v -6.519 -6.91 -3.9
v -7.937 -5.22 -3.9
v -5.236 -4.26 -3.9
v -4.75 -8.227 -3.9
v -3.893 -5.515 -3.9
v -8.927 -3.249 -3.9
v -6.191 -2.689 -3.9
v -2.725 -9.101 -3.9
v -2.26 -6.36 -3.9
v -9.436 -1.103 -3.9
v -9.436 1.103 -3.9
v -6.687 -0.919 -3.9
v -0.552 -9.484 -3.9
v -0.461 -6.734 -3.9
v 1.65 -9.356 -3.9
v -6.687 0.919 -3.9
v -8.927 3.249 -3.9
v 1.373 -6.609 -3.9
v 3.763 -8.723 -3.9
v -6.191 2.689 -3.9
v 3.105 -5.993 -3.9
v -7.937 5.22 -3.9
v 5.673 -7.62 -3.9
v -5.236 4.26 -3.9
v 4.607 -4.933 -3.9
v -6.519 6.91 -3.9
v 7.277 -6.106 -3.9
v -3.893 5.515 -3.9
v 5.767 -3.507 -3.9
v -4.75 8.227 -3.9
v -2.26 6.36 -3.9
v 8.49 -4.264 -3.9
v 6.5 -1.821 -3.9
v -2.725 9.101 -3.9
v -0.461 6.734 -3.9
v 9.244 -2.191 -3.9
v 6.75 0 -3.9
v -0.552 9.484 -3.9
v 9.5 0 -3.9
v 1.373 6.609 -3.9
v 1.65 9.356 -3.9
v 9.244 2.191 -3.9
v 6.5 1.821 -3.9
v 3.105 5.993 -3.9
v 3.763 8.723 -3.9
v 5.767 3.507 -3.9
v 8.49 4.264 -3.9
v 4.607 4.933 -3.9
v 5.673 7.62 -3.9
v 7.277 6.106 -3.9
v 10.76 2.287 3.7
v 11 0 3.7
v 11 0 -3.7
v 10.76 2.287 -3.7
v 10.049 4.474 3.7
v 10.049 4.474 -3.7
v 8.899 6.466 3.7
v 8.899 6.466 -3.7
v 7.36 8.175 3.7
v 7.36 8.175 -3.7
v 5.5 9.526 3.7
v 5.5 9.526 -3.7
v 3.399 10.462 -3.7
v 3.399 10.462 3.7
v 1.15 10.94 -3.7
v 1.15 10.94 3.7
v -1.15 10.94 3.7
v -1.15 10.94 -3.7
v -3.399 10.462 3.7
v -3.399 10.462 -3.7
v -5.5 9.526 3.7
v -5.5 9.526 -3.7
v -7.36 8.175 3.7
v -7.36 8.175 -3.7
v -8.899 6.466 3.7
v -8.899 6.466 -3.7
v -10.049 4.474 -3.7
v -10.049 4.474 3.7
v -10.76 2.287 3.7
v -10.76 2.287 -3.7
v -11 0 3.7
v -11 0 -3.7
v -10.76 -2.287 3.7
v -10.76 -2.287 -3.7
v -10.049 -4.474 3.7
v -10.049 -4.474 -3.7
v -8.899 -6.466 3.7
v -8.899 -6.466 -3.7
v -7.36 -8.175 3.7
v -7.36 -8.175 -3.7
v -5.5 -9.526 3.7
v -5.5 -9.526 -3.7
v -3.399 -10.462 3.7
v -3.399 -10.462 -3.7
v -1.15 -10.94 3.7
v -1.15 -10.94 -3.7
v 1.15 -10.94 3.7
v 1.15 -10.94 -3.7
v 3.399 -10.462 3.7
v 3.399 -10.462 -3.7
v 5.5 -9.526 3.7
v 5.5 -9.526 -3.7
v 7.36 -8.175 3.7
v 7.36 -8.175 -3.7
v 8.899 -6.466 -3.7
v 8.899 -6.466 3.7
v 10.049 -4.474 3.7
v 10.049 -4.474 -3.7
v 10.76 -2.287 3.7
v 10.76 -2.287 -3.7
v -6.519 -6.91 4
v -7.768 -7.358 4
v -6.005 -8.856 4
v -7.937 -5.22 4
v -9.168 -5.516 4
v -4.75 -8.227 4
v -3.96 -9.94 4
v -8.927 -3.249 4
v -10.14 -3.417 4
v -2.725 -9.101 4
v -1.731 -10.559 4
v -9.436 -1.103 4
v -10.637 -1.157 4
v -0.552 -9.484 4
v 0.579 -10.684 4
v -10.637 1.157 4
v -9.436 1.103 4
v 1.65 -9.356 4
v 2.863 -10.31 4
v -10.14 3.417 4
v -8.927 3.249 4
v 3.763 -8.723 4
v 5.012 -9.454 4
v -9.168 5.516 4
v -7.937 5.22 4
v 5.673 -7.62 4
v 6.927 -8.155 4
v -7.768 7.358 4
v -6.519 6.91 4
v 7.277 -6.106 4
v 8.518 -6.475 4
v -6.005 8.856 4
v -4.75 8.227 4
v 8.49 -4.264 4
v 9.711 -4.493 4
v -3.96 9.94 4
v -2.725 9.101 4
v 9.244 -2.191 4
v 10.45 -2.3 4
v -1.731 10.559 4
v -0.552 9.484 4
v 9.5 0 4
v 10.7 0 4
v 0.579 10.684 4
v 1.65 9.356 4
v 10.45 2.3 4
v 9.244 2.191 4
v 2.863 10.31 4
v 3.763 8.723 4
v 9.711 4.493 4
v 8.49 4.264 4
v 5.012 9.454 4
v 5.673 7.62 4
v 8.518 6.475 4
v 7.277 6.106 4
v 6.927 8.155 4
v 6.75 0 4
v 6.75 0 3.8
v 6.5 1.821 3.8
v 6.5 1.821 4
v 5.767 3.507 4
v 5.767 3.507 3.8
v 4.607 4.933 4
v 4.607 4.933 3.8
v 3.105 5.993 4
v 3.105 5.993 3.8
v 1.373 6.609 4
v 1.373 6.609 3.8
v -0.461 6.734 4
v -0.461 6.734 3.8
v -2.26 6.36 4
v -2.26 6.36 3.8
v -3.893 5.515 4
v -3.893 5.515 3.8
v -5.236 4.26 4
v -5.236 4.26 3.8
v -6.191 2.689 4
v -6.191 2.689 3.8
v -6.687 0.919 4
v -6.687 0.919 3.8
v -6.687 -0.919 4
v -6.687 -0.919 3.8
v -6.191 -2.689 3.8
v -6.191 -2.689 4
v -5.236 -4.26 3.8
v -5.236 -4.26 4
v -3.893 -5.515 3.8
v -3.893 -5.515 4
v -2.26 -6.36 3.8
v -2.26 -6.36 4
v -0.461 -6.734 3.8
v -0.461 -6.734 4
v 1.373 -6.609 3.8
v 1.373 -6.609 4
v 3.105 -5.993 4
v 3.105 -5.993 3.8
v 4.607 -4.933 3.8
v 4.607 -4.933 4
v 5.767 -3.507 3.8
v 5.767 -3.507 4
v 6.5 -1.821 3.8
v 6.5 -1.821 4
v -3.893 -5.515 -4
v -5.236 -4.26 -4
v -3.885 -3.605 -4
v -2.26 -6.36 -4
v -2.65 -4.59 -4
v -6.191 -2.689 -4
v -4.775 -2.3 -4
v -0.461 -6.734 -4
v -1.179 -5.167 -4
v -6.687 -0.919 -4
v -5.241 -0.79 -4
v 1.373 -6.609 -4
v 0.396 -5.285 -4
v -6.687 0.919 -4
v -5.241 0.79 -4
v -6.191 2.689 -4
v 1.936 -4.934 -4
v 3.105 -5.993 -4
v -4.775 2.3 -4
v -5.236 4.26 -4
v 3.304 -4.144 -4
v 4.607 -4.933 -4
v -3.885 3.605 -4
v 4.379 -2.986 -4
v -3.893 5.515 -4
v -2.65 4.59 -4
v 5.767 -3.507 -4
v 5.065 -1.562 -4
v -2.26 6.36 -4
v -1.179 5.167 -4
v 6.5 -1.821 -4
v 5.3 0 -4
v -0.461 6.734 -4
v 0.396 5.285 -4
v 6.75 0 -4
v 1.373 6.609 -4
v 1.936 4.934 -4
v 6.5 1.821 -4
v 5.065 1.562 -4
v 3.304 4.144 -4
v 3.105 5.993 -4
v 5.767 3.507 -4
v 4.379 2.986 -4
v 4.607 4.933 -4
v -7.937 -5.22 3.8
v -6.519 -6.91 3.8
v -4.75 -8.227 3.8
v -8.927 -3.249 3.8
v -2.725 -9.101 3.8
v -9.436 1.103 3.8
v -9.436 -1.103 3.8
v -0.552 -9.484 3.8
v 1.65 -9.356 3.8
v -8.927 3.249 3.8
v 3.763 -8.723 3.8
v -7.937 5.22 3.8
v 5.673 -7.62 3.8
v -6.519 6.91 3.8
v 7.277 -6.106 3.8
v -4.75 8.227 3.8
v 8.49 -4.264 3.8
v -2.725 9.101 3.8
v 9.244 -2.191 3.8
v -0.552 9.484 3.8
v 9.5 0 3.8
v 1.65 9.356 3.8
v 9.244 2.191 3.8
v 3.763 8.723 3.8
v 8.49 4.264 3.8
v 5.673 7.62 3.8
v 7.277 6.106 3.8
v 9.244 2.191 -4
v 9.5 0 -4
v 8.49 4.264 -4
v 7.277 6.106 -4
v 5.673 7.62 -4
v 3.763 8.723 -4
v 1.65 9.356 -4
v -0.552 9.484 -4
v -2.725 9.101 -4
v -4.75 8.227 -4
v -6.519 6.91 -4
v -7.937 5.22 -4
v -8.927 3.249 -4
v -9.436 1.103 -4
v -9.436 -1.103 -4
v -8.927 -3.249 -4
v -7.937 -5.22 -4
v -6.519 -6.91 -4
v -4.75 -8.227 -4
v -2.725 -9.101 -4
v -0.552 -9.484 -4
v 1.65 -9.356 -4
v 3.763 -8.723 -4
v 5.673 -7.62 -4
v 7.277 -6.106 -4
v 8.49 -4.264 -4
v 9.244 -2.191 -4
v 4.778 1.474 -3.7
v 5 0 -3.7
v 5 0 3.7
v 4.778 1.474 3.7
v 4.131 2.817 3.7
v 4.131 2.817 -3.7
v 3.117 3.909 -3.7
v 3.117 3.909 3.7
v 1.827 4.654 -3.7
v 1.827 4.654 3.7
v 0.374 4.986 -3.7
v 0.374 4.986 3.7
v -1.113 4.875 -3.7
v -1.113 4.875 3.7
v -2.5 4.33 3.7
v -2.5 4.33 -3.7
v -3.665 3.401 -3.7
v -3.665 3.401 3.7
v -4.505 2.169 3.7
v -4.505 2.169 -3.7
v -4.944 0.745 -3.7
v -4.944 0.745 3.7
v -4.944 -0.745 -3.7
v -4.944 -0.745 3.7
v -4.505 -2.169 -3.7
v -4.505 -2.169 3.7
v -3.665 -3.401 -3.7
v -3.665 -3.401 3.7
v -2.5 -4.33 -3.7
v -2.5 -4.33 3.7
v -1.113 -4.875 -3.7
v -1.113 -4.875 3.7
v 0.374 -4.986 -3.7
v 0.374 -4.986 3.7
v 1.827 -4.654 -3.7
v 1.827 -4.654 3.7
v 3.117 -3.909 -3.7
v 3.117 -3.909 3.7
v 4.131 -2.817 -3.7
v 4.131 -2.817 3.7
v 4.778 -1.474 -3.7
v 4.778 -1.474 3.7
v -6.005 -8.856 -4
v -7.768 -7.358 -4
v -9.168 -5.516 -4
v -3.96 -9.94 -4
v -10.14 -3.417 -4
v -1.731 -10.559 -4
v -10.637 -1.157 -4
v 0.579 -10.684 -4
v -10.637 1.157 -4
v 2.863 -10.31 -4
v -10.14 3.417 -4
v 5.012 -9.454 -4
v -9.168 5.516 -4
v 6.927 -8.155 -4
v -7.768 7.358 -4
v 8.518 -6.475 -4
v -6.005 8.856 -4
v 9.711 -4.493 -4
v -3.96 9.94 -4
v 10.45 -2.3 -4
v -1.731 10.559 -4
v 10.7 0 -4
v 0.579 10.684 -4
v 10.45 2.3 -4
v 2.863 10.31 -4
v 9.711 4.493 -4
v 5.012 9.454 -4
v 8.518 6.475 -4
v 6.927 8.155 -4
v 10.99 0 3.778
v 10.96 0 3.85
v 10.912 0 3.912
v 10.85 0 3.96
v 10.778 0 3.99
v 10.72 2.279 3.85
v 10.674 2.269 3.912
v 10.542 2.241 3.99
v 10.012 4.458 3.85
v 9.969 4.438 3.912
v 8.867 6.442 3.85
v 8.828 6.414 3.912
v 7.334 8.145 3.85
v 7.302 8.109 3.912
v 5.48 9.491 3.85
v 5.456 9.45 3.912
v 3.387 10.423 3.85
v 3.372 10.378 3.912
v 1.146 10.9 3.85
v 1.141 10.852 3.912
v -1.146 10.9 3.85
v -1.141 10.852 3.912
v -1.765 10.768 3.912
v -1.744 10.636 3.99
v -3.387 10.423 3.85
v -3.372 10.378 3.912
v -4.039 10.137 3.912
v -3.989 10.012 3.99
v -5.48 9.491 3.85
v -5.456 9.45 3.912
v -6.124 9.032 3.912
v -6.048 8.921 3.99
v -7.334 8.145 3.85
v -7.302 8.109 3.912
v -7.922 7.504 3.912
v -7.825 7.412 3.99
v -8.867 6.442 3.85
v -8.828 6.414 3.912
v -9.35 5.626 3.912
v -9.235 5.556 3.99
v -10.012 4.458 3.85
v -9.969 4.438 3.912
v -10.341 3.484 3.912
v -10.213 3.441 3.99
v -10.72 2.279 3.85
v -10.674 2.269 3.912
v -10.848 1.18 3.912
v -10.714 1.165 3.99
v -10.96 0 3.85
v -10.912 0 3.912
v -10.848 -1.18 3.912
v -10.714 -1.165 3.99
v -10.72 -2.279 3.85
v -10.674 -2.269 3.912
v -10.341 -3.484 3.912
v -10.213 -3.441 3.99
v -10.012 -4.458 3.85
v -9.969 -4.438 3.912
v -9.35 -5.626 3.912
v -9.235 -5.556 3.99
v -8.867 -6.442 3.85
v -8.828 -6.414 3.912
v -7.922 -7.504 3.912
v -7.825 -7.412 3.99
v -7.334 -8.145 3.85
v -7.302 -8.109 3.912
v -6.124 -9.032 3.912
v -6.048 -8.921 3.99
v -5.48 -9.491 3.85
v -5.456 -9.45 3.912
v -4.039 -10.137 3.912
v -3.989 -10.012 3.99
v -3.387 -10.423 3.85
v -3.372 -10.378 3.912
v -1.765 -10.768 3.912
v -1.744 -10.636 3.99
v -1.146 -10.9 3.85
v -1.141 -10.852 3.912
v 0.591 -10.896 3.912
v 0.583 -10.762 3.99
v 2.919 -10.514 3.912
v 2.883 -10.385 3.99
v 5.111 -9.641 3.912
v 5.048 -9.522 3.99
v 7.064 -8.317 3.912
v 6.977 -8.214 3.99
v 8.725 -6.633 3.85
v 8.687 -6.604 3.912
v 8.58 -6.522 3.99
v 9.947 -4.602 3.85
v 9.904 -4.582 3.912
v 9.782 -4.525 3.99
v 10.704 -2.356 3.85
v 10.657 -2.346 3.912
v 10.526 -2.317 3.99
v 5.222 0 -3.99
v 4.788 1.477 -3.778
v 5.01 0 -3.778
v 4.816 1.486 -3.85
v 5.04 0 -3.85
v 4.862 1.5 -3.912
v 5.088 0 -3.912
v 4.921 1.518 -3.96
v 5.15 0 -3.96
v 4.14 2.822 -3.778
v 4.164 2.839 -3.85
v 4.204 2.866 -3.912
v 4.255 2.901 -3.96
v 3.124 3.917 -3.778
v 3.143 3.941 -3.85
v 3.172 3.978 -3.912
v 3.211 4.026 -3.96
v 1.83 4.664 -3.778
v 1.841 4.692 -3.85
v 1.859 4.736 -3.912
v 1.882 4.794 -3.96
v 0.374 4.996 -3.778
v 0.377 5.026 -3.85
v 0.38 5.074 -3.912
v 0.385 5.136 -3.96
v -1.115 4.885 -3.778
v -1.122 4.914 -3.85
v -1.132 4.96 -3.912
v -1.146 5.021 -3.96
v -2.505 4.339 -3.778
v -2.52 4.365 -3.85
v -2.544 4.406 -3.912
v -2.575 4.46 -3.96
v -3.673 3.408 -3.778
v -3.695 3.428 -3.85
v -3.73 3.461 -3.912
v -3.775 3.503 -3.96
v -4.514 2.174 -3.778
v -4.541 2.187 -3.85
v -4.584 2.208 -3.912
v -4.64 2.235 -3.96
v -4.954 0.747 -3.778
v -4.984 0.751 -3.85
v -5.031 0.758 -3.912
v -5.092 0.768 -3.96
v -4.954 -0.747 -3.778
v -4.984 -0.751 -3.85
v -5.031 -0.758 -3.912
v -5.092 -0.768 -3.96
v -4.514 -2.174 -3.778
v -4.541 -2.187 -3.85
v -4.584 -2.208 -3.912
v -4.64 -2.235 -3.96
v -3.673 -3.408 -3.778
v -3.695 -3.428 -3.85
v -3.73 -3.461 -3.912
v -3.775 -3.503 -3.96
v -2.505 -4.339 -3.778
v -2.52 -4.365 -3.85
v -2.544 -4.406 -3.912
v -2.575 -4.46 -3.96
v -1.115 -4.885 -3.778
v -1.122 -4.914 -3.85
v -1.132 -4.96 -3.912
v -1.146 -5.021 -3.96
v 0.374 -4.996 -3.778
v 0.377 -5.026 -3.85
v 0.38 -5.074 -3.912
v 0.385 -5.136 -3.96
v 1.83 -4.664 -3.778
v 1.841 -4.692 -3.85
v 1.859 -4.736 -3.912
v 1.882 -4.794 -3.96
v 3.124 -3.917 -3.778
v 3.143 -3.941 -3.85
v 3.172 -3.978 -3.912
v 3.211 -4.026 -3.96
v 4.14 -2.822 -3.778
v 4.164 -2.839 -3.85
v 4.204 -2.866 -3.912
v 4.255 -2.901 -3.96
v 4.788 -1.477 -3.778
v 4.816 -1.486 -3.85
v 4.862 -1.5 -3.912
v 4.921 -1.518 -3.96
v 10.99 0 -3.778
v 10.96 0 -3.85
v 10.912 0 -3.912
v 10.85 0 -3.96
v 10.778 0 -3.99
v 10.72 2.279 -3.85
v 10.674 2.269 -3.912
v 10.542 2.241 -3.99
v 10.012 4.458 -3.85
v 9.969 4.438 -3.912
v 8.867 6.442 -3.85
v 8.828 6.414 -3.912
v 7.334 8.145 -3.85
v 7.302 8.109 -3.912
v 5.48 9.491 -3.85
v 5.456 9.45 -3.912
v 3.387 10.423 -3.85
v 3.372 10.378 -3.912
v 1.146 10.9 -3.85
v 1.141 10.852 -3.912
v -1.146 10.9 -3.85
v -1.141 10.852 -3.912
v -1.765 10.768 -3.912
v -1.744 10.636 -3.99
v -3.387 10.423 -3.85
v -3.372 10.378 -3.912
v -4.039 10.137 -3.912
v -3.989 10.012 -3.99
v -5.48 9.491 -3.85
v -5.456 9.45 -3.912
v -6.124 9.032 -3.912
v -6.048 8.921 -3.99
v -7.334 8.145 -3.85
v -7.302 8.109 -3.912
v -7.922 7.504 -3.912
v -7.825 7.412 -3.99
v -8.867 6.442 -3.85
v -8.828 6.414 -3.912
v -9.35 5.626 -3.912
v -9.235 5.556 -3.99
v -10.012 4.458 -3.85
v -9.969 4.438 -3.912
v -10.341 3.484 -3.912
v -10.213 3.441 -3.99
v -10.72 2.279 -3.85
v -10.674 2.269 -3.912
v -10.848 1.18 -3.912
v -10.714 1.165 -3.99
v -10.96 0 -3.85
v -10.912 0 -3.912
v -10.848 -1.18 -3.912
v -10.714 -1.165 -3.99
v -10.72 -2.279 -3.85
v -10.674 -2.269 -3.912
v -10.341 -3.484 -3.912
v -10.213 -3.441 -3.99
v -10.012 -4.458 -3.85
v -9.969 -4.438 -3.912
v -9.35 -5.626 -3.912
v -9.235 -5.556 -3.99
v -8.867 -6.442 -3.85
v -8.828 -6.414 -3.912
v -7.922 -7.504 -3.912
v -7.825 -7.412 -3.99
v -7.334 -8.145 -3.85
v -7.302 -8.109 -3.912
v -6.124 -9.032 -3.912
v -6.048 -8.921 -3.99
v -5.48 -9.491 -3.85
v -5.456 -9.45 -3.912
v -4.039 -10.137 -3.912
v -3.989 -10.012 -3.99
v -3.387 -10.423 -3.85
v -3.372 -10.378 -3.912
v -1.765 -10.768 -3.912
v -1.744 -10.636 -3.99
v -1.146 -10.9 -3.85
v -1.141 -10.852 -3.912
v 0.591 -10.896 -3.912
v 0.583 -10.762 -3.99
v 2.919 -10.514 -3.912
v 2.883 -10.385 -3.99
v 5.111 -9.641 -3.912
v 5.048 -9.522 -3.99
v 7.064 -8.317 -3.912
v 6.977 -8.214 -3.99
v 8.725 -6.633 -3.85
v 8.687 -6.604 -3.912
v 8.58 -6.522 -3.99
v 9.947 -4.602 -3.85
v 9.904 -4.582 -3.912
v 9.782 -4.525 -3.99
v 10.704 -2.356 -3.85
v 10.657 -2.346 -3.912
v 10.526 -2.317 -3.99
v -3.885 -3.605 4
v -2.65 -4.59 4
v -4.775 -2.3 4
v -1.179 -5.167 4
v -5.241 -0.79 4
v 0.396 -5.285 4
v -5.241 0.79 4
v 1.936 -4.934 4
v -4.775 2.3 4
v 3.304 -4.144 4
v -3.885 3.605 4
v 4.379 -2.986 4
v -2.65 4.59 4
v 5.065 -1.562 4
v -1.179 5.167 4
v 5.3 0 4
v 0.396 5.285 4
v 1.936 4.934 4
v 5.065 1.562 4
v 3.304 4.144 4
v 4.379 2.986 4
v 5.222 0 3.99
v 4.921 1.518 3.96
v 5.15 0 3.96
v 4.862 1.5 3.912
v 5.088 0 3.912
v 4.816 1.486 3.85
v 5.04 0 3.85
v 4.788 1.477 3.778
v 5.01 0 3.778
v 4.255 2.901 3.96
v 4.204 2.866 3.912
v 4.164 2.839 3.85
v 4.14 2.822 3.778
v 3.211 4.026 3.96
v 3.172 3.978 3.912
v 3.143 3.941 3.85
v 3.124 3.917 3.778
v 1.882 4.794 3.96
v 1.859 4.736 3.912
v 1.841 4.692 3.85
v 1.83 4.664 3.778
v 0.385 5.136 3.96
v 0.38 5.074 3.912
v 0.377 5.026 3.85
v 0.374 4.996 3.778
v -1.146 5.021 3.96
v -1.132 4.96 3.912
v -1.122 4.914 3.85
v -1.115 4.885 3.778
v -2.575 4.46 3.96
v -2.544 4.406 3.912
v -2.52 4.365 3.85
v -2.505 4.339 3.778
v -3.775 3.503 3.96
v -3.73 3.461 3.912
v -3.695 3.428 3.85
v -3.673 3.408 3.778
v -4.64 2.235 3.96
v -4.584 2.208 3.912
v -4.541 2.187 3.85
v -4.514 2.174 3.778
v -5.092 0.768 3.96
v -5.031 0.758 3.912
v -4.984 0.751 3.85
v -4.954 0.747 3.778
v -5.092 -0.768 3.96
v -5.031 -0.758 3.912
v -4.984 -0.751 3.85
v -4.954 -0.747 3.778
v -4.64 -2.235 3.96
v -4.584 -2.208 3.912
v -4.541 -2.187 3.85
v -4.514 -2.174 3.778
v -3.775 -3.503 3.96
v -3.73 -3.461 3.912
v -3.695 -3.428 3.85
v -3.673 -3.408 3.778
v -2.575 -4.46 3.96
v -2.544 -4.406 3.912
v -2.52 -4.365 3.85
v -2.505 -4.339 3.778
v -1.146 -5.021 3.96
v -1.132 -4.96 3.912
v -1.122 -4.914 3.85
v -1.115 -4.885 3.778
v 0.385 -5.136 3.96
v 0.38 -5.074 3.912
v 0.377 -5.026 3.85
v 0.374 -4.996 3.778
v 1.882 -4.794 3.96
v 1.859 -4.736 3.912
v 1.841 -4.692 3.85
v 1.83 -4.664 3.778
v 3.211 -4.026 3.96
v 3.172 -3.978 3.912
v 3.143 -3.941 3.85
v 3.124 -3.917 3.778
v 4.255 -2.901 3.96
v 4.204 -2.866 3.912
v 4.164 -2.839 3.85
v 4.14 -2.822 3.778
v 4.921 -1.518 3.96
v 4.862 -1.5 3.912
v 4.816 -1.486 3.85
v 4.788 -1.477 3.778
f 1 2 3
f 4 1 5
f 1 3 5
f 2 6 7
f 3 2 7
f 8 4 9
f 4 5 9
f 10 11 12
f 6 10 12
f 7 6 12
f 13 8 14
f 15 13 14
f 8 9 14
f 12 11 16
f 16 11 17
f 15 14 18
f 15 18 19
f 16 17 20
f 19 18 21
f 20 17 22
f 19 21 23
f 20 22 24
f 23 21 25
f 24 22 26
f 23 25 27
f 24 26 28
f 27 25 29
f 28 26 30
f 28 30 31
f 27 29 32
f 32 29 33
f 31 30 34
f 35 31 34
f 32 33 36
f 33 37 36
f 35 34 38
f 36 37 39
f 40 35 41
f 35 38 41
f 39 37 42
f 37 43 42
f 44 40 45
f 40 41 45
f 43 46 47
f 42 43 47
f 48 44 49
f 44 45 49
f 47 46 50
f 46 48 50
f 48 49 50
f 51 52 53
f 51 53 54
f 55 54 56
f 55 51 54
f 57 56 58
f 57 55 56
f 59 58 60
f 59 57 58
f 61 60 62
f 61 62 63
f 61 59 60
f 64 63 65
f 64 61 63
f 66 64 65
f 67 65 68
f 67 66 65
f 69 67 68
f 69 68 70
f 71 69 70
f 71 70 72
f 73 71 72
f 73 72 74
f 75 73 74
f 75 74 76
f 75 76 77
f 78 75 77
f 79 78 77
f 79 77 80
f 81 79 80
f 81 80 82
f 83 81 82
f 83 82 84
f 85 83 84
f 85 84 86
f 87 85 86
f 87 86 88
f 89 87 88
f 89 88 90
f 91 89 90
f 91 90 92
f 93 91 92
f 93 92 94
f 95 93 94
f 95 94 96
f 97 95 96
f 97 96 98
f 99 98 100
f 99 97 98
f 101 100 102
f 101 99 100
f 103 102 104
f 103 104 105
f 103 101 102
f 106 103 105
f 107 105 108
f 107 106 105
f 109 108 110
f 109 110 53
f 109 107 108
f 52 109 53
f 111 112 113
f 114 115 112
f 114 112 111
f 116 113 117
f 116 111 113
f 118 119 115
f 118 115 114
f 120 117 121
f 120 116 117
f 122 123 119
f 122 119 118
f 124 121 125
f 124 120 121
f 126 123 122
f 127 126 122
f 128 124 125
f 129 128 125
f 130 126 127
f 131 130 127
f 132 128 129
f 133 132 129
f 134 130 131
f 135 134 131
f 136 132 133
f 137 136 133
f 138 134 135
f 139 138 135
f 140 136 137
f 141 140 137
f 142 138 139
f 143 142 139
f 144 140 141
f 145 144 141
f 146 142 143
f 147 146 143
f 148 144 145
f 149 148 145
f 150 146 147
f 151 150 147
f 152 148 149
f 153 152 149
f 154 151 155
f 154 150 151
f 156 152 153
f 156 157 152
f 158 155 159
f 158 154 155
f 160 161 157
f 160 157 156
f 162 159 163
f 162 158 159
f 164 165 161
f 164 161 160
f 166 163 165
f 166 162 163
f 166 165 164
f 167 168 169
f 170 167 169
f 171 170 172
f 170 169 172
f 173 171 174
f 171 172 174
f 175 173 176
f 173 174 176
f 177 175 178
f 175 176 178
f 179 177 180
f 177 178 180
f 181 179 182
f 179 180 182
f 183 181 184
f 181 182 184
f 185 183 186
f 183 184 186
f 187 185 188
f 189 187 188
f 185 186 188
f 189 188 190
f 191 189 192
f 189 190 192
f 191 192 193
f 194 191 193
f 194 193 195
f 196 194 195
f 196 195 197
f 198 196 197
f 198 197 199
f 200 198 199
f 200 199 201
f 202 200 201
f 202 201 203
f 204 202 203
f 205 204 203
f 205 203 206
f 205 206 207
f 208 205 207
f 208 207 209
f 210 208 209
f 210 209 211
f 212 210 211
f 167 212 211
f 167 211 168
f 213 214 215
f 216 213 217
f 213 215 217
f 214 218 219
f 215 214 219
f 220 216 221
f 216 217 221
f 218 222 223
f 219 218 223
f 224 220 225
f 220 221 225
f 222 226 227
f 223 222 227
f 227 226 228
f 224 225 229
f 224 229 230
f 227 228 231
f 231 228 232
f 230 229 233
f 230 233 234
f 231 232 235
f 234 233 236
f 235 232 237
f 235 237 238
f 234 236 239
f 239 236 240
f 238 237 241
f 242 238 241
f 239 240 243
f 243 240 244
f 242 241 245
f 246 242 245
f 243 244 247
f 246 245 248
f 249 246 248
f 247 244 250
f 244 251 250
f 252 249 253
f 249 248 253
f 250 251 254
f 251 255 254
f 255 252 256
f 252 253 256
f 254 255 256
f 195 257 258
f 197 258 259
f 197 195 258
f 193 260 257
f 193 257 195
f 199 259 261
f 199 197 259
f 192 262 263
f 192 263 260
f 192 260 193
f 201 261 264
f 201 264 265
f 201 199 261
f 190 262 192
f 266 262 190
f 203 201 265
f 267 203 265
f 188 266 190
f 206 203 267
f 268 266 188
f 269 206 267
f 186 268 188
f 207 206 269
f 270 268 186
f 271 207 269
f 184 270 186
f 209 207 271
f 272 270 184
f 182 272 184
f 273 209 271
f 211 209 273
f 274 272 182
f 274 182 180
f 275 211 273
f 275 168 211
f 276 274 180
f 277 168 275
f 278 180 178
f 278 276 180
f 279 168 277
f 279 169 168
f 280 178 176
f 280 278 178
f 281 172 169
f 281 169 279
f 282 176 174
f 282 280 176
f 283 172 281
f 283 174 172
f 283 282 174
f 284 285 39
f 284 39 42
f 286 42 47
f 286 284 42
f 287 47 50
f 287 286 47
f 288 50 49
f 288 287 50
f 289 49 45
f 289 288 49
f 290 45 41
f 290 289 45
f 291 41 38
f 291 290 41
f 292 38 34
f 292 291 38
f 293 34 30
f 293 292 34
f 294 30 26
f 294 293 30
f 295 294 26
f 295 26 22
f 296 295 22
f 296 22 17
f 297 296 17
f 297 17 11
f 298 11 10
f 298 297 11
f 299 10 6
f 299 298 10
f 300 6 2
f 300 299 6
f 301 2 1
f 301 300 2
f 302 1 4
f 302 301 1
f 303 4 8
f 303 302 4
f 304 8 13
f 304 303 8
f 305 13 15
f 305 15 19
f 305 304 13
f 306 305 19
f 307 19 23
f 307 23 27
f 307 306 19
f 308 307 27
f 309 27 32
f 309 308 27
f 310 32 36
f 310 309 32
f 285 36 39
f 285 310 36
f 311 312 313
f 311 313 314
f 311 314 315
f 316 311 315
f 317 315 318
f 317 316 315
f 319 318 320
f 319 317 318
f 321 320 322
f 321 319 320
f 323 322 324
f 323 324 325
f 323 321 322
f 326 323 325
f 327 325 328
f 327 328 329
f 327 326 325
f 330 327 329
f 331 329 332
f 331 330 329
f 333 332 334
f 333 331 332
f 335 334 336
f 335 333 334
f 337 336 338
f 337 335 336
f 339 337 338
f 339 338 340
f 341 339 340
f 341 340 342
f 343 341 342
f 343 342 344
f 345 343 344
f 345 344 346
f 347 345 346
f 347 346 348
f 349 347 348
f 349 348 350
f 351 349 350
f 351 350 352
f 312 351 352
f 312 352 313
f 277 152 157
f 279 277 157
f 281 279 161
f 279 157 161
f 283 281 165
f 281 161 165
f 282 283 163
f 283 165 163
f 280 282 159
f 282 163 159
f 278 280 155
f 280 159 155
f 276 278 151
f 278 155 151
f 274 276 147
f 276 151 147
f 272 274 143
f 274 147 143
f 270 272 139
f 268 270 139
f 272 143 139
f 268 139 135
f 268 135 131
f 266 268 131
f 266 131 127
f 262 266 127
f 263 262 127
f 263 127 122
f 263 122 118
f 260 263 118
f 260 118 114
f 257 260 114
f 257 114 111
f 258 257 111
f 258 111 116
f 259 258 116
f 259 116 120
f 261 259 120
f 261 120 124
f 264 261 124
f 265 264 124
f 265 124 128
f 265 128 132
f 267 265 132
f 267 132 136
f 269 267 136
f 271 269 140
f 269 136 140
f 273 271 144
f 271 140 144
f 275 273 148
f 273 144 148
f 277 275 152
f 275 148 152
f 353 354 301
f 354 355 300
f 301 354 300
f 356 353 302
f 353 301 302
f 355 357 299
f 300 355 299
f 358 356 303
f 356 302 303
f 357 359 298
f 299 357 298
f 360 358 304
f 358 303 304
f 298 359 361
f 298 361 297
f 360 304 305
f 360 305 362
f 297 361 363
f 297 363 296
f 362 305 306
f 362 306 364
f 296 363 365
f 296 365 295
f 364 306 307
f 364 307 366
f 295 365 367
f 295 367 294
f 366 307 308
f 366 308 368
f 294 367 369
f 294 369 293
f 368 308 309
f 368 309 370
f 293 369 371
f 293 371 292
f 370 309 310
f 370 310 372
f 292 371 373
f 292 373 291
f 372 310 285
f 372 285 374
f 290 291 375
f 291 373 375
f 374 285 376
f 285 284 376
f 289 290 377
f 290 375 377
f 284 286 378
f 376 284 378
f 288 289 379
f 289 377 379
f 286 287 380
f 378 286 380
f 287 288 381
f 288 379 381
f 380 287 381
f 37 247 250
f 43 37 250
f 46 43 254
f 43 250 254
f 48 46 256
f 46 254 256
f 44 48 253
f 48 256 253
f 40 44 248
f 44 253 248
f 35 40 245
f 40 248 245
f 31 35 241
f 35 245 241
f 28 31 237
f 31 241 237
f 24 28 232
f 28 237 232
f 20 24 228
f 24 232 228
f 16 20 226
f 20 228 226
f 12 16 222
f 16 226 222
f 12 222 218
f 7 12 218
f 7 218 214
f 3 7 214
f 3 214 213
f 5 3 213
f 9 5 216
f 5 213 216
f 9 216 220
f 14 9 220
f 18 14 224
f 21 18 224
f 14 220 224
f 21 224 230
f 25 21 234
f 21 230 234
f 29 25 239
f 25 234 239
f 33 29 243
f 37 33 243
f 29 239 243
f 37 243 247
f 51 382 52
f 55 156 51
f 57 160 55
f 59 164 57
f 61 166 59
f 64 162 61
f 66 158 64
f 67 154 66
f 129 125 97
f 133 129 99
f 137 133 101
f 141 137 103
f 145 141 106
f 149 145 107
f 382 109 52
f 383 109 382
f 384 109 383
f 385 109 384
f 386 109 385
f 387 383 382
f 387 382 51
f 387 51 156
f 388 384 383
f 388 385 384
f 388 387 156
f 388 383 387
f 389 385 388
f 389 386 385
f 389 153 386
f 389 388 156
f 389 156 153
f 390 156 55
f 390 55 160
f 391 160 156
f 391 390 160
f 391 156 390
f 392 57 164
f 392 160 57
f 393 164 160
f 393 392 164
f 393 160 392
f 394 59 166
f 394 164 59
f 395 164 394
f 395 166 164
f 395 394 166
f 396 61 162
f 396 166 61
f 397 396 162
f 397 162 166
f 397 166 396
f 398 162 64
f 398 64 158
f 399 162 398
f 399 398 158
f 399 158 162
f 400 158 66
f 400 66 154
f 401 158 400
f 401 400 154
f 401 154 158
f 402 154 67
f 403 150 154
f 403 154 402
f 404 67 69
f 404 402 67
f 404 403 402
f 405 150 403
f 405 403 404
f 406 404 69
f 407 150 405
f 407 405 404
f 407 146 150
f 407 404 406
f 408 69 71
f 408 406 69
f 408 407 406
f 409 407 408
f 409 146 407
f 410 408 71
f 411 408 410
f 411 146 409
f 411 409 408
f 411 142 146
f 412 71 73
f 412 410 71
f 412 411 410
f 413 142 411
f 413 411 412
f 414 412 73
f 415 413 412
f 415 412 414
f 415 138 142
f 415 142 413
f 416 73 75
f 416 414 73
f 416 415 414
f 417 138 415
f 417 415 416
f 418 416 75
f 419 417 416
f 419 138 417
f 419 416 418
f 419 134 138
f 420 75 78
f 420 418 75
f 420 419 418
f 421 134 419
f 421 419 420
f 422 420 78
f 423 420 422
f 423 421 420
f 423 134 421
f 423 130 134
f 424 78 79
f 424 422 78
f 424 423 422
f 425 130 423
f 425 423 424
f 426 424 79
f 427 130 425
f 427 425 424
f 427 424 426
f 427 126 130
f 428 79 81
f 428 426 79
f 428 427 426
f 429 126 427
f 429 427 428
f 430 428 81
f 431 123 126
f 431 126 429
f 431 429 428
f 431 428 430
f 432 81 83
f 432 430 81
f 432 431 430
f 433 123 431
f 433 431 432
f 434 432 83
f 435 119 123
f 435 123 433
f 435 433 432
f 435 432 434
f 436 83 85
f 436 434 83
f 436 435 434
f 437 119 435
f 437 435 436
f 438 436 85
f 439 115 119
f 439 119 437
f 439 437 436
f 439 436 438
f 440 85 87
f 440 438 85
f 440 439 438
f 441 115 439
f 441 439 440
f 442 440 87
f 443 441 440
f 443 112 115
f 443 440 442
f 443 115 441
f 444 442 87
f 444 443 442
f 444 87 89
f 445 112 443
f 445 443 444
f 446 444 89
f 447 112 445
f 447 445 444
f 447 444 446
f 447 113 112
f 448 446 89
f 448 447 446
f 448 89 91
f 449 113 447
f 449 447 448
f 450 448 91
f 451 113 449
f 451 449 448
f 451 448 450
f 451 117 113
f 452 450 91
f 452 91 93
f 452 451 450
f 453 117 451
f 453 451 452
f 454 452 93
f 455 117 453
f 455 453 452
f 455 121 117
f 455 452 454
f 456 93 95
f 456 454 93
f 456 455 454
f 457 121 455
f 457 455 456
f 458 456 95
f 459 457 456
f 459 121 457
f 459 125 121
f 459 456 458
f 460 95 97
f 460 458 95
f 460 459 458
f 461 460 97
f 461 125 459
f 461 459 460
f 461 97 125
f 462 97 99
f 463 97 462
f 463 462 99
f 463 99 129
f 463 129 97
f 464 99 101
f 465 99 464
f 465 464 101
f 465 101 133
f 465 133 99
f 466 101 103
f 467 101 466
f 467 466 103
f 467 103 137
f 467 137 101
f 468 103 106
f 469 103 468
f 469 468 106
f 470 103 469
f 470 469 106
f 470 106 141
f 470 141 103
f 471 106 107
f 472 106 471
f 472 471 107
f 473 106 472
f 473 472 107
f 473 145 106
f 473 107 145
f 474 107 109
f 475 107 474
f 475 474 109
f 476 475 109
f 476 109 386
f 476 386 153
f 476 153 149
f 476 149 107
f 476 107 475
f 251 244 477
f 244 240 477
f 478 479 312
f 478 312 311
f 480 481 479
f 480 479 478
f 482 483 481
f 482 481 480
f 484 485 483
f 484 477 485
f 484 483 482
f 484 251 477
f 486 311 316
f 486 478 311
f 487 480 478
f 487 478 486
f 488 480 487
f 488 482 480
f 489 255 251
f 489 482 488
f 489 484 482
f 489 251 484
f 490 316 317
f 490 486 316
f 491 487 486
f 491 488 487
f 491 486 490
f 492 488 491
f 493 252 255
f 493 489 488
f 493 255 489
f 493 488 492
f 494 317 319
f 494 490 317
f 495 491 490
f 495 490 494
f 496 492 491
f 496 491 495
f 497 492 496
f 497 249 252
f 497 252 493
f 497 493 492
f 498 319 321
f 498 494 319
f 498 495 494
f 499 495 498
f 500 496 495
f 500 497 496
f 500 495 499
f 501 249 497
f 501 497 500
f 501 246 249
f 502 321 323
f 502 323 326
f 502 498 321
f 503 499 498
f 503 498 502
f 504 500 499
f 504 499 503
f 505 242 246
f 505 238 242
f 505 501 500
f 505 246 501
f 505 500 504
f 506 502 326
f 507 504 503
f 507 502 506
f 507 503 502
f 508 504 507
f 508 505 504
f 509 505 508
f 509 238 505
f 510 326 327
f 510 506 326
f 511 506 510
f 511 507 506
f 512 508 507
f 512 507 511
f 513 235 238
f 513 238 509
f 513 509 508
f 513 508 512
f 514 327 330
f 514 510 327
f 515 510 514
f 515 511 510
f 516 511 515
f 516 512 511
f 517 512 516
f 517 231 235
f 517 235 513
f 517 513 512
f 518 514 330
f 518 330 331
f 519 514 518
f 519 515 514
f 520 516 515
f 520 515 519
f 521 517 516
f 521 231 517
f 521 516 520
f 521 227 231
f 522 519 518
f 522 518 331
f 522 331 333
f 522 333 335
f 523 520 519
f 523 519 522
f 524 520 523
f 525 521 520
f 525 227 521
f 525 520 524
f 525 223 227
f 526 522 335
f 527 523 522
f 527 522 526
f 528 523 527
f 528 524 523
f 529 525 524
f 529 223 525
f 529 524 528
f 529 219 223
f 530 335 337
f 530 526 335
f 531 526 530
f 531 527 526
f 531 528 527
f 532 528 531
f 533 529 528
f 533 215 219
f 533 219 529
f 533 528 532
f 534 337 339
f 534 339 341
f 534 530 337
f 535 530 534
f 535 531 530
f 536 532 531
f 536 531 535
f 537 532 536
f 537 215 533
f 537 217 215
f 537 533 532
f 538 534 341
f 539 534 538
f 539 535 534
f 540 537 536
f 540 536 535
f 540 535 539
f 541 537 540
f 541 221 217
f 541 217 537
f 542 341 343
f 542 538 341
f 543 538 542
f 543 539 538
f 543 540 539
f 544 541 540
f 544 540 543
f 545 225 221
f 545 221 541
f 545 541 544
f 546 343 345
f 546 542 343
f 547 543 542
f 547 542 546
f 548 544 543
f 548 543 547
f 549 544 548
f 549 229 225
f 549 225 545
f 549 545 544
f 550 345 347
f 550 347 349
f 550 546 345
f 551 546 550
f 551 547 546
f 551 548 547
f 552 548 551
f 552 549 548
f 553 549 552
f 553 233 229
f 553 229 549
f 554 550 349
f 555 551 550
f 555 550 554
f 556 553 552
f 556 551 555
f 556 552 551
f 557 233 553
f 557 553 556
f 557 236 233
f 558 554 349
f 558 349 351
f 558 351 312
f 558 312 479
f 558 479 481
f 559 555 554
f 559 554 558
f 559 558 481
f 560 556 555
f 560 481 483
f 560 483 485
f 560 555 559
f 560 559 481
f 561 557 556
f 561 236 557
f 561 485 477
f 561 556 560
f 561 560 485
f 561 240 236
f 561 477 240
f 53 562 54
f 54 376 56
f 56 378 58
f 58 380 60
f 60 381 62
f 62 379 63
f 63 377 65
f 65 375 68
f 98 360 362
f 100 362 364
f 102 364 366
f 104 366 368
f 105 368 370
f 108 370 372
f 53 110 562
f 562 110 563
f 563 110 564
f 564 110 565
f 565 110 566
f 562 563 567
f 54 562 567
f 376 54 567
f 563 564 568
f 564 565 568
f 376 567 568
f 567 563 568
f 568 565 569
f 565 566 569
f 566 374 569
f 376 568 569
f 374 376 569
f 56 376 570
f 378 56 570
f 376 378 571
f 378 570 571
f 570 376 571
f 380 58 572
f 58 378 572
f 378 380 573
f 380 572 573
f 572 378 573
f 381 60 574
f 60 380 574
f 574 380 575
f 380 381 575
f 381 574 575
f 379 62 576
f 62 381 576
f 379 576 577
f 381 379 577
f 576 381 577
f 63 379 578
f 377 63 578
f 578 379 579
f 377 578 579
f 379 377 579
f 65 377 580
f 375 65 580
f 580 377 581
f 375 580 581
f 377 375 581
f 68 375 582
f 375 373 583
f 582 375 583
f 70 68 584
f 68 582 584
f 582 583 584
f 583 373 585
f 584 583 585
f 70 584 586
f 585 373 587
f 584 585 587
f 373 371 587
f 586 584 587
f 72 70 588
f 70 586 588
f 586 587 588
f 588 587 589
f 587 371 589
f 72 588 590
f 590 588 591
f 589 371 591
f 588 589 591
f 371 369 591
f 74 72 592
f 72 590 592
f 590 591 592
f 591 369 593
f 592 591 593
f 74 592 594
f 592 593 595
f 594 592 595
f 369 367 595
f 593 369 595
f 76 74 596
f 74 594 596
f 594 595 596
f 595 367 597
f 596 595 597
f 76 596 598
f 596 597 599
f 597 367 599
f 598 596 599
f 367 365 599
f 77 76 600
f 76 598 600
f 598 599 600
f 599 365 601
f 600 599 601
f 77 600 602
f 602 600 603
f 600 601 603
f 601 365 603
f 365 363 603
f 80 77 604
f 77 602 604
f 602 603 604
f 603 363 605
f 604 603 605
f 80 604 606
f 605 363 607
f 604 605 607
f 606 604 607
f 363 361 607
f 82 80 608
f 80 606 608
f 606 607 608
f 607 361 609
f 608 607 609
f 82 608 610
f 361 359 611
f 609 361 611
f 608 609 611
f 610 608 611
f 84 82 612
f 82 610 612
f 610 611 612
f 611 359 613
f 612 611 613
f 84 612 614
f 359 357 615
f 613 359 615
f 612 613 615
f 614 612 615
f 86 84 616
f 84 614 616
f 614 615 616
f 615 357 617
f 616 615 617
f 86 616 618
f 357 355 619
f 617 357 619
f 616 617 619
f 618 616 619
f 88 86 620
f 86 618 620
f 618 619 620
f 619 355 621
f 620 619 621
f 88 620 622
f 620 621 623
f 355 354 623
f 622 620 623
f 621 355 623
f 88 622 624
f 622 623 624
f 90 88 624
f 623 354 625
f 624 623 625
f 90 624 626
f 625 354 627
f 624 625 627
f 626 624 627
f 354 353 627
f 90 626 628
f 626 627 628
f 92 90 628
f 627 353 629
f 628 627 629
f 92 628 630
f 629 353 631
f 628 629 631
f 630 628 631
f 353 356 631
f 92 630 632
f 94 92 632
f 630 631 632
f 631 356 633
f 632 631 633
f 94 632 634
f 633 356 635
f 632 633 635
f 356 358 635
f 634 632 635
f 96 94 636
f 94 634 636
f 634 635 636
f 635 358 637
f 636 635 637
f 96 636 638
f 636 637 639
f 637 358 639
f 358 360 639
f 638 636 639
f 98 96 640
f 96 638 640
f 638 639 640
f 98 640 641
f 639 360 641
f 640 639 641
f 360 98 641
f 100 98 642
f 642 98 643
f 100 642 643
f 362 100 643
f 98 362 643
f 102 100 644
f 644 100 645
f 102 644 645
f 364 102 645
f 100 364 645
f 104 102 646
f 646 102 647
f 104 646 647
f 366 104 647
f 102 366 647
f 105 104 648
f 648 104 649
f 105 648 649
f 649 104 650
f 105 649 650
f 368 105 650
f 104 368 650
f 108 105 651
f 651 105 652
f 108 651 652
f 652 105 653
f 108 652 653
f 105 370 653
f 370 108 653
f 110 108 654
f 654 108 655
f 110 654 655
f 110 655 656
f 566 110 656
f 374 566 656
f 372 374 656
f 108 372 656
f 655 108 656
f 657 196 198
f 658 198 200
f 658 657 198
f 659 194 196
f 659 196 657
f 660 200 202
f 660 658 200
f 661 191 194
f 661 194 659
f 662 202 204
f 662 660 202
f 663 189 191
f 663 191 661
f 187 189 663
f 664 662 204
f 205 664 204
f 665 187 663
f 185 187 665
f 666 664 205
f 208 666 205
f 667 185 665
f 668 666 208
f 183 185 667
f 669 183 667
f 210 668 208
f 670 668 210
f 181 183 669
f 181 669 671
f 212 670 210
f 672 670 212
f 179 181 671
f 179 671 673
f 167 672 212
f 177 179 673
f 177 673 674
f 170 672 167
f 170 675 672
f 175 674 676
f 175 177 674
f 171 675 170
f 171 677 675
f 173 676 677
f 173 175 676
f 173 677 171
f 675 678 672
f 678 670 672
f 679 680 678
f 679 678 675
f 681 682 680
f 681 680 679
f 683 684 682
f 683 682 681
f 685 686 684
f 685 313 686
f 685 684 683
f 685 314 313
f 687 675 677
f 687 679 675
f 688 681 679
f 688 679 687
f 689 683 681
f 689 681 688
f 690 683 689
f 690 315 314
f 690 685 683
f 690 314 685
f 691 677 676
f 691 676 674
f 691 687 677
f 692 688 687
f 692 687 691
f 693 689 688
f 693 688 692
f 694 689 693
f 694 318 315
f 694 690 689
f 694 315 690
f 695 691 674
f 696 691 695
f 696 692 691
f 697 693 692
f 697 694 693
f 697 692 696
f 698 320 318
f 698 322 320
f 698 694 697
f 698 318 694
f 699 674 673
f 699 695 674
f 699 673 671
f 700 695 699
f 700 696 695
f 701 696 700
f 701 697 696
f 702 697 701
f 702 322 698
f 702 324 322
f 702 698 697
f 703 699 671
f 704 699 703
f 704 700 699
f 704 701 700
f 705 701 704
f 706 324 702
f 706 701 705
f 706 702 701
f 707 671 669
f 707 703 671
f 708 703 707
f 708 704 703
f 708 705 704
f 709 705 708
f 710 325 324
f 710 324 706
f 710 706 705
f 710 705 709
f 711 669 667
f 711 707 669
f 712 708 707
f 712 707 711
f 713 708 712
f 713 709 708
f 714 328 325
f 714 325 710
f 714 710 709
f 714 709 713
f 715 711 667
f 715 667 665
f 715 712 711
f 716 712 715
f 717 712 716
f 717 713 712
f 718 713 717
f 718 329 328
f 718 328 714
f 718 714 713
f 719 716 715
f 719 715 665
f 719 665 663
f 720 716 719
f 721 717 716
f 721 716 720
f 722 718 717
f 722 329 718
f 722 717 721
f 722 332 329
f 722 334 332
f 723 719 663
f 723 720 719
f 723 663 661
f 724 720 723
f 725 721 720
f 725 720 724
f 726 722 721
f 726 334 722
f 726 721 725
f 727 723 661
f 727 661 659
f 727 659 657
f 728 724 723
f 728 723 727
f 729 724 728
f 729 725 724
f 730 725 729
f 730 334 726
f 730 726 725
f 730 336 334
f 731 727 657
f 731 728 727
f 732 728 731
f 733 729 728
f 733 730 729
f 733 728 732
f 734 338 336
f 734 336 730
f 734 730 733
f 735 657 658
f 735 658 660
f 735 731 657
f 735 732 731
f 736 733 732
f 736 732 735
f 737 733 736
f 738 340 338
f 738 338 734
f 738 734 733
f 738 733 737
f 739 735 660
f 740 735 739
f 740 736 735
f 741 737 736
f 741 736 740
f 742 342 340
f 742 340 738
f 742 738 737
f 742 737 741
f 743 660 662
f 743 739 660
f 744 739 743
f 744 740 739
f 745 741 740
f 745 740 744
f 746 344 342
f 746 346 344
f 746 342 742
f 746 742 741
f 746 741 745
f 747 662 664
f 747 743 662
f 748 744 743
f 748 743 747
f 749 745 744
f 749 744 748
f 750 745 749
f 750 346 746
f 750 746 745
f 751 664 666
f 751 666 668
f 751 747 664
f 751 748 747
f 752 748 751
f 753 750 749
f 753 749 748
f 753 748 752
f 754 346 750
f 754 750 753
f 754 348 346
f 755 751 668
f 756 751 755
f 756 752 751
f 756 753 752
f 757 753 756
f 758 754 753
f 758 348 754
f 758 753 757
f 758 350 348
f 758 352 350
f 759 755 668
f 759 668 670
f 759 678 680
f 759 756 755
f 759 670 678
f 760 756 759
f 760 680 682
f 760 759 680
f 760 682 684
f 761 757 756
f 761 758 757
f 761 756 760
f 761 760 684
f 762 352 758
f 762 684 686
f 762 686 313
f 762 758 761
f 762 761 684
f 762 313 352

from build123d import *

# Parameters (mm, degrees)
SKETCH1_R             = 11
SKETCH1_R_2           = 5
BOSS_EXTRUDE1_DEPTH   = 4
SKETCH2_R             = 9.5
SKETCH2_R_2           = 6.75
CUT_EXTRUDE1_DEPTH    = 0.1
MIRROR1_START         = -4
MIRROR1_OUTLINE_R     = 9.5
MIRROR1_OUTLINE_R_2   = 6.75
MIRROR1_DEPTH         = 0.1
MIRROR1_START_2       = 3.8
MIRROR1_2_OUTLINE_R   = 9.5
MIRROR1_2_OUTLINE_R_2 = 6.75
MIRROR1_2_DEPTH       = 0.1
FILLET1_R             = 0.3


# Read off the part's stored shape, not the designer's step: Mirror1
with BuildPart() as part:
    # Sketch1 → Boss-Extrude1 (new, symmetric)
    with BuildSketch(Plane.XY):
        Circle(SKETCH1_R)
        Circle(SKETCH1_R_2, mode=Mode.SUBTRACT)
    extrude(amount=BOSS_EXTRUDE1_DEPTH, both=True)

    # Sketch2 → Cut-Extrude1 (cut)
    with BuildSketch(Plane.XY.offset(4)):
        Circle(SKETCH2_R)
        Circle(SKETCH2_R_2, mode=Mode.SUBTRACT)
    extrude(amount=-CUT_EXTRUDE1_DEPTH, mode=Mode.SUBTRACT)

    # Mirror1 outline → Mirror1 (cut)
    with BuildSketch(Plane.XY.offset(MIRROR1_START)):
        Circle(MIRROR1_OUTLINE_R)
        Circle(MIRROR1_OUTLINE_R_2, mode=Mode.SUBTRACT)
    extrude(amount=MIRROR1_DEPTH, mode=Mode.SUBTRACT)

    # Mirror1 2 outline → Mirror1 2 (cut)
    with BuildSketch(Plane.XY.offset(MIRROR1_START_2)):
        Circle(MIRROR1_2_OUTLINE_R)
        Circle(MIRROR1_2_OUTLINE_R_2, mode=Mode.SUBTRACT)
    extrude(amount=MIRROR1_2_DEPTH, mode=Mode.SUBTRACT)

    # Fillet1
    fillet1_edges = [part.edges().sort_by_distance(p)[0] for p in [
        (-11, 0, -4),
        (-11, 0, 4),
        (-5, 0, -4),
        (-5, 0, 4),
    ]]
    fillet(fillet1_edges, radius=FILLET1_R)


solid = part.part
